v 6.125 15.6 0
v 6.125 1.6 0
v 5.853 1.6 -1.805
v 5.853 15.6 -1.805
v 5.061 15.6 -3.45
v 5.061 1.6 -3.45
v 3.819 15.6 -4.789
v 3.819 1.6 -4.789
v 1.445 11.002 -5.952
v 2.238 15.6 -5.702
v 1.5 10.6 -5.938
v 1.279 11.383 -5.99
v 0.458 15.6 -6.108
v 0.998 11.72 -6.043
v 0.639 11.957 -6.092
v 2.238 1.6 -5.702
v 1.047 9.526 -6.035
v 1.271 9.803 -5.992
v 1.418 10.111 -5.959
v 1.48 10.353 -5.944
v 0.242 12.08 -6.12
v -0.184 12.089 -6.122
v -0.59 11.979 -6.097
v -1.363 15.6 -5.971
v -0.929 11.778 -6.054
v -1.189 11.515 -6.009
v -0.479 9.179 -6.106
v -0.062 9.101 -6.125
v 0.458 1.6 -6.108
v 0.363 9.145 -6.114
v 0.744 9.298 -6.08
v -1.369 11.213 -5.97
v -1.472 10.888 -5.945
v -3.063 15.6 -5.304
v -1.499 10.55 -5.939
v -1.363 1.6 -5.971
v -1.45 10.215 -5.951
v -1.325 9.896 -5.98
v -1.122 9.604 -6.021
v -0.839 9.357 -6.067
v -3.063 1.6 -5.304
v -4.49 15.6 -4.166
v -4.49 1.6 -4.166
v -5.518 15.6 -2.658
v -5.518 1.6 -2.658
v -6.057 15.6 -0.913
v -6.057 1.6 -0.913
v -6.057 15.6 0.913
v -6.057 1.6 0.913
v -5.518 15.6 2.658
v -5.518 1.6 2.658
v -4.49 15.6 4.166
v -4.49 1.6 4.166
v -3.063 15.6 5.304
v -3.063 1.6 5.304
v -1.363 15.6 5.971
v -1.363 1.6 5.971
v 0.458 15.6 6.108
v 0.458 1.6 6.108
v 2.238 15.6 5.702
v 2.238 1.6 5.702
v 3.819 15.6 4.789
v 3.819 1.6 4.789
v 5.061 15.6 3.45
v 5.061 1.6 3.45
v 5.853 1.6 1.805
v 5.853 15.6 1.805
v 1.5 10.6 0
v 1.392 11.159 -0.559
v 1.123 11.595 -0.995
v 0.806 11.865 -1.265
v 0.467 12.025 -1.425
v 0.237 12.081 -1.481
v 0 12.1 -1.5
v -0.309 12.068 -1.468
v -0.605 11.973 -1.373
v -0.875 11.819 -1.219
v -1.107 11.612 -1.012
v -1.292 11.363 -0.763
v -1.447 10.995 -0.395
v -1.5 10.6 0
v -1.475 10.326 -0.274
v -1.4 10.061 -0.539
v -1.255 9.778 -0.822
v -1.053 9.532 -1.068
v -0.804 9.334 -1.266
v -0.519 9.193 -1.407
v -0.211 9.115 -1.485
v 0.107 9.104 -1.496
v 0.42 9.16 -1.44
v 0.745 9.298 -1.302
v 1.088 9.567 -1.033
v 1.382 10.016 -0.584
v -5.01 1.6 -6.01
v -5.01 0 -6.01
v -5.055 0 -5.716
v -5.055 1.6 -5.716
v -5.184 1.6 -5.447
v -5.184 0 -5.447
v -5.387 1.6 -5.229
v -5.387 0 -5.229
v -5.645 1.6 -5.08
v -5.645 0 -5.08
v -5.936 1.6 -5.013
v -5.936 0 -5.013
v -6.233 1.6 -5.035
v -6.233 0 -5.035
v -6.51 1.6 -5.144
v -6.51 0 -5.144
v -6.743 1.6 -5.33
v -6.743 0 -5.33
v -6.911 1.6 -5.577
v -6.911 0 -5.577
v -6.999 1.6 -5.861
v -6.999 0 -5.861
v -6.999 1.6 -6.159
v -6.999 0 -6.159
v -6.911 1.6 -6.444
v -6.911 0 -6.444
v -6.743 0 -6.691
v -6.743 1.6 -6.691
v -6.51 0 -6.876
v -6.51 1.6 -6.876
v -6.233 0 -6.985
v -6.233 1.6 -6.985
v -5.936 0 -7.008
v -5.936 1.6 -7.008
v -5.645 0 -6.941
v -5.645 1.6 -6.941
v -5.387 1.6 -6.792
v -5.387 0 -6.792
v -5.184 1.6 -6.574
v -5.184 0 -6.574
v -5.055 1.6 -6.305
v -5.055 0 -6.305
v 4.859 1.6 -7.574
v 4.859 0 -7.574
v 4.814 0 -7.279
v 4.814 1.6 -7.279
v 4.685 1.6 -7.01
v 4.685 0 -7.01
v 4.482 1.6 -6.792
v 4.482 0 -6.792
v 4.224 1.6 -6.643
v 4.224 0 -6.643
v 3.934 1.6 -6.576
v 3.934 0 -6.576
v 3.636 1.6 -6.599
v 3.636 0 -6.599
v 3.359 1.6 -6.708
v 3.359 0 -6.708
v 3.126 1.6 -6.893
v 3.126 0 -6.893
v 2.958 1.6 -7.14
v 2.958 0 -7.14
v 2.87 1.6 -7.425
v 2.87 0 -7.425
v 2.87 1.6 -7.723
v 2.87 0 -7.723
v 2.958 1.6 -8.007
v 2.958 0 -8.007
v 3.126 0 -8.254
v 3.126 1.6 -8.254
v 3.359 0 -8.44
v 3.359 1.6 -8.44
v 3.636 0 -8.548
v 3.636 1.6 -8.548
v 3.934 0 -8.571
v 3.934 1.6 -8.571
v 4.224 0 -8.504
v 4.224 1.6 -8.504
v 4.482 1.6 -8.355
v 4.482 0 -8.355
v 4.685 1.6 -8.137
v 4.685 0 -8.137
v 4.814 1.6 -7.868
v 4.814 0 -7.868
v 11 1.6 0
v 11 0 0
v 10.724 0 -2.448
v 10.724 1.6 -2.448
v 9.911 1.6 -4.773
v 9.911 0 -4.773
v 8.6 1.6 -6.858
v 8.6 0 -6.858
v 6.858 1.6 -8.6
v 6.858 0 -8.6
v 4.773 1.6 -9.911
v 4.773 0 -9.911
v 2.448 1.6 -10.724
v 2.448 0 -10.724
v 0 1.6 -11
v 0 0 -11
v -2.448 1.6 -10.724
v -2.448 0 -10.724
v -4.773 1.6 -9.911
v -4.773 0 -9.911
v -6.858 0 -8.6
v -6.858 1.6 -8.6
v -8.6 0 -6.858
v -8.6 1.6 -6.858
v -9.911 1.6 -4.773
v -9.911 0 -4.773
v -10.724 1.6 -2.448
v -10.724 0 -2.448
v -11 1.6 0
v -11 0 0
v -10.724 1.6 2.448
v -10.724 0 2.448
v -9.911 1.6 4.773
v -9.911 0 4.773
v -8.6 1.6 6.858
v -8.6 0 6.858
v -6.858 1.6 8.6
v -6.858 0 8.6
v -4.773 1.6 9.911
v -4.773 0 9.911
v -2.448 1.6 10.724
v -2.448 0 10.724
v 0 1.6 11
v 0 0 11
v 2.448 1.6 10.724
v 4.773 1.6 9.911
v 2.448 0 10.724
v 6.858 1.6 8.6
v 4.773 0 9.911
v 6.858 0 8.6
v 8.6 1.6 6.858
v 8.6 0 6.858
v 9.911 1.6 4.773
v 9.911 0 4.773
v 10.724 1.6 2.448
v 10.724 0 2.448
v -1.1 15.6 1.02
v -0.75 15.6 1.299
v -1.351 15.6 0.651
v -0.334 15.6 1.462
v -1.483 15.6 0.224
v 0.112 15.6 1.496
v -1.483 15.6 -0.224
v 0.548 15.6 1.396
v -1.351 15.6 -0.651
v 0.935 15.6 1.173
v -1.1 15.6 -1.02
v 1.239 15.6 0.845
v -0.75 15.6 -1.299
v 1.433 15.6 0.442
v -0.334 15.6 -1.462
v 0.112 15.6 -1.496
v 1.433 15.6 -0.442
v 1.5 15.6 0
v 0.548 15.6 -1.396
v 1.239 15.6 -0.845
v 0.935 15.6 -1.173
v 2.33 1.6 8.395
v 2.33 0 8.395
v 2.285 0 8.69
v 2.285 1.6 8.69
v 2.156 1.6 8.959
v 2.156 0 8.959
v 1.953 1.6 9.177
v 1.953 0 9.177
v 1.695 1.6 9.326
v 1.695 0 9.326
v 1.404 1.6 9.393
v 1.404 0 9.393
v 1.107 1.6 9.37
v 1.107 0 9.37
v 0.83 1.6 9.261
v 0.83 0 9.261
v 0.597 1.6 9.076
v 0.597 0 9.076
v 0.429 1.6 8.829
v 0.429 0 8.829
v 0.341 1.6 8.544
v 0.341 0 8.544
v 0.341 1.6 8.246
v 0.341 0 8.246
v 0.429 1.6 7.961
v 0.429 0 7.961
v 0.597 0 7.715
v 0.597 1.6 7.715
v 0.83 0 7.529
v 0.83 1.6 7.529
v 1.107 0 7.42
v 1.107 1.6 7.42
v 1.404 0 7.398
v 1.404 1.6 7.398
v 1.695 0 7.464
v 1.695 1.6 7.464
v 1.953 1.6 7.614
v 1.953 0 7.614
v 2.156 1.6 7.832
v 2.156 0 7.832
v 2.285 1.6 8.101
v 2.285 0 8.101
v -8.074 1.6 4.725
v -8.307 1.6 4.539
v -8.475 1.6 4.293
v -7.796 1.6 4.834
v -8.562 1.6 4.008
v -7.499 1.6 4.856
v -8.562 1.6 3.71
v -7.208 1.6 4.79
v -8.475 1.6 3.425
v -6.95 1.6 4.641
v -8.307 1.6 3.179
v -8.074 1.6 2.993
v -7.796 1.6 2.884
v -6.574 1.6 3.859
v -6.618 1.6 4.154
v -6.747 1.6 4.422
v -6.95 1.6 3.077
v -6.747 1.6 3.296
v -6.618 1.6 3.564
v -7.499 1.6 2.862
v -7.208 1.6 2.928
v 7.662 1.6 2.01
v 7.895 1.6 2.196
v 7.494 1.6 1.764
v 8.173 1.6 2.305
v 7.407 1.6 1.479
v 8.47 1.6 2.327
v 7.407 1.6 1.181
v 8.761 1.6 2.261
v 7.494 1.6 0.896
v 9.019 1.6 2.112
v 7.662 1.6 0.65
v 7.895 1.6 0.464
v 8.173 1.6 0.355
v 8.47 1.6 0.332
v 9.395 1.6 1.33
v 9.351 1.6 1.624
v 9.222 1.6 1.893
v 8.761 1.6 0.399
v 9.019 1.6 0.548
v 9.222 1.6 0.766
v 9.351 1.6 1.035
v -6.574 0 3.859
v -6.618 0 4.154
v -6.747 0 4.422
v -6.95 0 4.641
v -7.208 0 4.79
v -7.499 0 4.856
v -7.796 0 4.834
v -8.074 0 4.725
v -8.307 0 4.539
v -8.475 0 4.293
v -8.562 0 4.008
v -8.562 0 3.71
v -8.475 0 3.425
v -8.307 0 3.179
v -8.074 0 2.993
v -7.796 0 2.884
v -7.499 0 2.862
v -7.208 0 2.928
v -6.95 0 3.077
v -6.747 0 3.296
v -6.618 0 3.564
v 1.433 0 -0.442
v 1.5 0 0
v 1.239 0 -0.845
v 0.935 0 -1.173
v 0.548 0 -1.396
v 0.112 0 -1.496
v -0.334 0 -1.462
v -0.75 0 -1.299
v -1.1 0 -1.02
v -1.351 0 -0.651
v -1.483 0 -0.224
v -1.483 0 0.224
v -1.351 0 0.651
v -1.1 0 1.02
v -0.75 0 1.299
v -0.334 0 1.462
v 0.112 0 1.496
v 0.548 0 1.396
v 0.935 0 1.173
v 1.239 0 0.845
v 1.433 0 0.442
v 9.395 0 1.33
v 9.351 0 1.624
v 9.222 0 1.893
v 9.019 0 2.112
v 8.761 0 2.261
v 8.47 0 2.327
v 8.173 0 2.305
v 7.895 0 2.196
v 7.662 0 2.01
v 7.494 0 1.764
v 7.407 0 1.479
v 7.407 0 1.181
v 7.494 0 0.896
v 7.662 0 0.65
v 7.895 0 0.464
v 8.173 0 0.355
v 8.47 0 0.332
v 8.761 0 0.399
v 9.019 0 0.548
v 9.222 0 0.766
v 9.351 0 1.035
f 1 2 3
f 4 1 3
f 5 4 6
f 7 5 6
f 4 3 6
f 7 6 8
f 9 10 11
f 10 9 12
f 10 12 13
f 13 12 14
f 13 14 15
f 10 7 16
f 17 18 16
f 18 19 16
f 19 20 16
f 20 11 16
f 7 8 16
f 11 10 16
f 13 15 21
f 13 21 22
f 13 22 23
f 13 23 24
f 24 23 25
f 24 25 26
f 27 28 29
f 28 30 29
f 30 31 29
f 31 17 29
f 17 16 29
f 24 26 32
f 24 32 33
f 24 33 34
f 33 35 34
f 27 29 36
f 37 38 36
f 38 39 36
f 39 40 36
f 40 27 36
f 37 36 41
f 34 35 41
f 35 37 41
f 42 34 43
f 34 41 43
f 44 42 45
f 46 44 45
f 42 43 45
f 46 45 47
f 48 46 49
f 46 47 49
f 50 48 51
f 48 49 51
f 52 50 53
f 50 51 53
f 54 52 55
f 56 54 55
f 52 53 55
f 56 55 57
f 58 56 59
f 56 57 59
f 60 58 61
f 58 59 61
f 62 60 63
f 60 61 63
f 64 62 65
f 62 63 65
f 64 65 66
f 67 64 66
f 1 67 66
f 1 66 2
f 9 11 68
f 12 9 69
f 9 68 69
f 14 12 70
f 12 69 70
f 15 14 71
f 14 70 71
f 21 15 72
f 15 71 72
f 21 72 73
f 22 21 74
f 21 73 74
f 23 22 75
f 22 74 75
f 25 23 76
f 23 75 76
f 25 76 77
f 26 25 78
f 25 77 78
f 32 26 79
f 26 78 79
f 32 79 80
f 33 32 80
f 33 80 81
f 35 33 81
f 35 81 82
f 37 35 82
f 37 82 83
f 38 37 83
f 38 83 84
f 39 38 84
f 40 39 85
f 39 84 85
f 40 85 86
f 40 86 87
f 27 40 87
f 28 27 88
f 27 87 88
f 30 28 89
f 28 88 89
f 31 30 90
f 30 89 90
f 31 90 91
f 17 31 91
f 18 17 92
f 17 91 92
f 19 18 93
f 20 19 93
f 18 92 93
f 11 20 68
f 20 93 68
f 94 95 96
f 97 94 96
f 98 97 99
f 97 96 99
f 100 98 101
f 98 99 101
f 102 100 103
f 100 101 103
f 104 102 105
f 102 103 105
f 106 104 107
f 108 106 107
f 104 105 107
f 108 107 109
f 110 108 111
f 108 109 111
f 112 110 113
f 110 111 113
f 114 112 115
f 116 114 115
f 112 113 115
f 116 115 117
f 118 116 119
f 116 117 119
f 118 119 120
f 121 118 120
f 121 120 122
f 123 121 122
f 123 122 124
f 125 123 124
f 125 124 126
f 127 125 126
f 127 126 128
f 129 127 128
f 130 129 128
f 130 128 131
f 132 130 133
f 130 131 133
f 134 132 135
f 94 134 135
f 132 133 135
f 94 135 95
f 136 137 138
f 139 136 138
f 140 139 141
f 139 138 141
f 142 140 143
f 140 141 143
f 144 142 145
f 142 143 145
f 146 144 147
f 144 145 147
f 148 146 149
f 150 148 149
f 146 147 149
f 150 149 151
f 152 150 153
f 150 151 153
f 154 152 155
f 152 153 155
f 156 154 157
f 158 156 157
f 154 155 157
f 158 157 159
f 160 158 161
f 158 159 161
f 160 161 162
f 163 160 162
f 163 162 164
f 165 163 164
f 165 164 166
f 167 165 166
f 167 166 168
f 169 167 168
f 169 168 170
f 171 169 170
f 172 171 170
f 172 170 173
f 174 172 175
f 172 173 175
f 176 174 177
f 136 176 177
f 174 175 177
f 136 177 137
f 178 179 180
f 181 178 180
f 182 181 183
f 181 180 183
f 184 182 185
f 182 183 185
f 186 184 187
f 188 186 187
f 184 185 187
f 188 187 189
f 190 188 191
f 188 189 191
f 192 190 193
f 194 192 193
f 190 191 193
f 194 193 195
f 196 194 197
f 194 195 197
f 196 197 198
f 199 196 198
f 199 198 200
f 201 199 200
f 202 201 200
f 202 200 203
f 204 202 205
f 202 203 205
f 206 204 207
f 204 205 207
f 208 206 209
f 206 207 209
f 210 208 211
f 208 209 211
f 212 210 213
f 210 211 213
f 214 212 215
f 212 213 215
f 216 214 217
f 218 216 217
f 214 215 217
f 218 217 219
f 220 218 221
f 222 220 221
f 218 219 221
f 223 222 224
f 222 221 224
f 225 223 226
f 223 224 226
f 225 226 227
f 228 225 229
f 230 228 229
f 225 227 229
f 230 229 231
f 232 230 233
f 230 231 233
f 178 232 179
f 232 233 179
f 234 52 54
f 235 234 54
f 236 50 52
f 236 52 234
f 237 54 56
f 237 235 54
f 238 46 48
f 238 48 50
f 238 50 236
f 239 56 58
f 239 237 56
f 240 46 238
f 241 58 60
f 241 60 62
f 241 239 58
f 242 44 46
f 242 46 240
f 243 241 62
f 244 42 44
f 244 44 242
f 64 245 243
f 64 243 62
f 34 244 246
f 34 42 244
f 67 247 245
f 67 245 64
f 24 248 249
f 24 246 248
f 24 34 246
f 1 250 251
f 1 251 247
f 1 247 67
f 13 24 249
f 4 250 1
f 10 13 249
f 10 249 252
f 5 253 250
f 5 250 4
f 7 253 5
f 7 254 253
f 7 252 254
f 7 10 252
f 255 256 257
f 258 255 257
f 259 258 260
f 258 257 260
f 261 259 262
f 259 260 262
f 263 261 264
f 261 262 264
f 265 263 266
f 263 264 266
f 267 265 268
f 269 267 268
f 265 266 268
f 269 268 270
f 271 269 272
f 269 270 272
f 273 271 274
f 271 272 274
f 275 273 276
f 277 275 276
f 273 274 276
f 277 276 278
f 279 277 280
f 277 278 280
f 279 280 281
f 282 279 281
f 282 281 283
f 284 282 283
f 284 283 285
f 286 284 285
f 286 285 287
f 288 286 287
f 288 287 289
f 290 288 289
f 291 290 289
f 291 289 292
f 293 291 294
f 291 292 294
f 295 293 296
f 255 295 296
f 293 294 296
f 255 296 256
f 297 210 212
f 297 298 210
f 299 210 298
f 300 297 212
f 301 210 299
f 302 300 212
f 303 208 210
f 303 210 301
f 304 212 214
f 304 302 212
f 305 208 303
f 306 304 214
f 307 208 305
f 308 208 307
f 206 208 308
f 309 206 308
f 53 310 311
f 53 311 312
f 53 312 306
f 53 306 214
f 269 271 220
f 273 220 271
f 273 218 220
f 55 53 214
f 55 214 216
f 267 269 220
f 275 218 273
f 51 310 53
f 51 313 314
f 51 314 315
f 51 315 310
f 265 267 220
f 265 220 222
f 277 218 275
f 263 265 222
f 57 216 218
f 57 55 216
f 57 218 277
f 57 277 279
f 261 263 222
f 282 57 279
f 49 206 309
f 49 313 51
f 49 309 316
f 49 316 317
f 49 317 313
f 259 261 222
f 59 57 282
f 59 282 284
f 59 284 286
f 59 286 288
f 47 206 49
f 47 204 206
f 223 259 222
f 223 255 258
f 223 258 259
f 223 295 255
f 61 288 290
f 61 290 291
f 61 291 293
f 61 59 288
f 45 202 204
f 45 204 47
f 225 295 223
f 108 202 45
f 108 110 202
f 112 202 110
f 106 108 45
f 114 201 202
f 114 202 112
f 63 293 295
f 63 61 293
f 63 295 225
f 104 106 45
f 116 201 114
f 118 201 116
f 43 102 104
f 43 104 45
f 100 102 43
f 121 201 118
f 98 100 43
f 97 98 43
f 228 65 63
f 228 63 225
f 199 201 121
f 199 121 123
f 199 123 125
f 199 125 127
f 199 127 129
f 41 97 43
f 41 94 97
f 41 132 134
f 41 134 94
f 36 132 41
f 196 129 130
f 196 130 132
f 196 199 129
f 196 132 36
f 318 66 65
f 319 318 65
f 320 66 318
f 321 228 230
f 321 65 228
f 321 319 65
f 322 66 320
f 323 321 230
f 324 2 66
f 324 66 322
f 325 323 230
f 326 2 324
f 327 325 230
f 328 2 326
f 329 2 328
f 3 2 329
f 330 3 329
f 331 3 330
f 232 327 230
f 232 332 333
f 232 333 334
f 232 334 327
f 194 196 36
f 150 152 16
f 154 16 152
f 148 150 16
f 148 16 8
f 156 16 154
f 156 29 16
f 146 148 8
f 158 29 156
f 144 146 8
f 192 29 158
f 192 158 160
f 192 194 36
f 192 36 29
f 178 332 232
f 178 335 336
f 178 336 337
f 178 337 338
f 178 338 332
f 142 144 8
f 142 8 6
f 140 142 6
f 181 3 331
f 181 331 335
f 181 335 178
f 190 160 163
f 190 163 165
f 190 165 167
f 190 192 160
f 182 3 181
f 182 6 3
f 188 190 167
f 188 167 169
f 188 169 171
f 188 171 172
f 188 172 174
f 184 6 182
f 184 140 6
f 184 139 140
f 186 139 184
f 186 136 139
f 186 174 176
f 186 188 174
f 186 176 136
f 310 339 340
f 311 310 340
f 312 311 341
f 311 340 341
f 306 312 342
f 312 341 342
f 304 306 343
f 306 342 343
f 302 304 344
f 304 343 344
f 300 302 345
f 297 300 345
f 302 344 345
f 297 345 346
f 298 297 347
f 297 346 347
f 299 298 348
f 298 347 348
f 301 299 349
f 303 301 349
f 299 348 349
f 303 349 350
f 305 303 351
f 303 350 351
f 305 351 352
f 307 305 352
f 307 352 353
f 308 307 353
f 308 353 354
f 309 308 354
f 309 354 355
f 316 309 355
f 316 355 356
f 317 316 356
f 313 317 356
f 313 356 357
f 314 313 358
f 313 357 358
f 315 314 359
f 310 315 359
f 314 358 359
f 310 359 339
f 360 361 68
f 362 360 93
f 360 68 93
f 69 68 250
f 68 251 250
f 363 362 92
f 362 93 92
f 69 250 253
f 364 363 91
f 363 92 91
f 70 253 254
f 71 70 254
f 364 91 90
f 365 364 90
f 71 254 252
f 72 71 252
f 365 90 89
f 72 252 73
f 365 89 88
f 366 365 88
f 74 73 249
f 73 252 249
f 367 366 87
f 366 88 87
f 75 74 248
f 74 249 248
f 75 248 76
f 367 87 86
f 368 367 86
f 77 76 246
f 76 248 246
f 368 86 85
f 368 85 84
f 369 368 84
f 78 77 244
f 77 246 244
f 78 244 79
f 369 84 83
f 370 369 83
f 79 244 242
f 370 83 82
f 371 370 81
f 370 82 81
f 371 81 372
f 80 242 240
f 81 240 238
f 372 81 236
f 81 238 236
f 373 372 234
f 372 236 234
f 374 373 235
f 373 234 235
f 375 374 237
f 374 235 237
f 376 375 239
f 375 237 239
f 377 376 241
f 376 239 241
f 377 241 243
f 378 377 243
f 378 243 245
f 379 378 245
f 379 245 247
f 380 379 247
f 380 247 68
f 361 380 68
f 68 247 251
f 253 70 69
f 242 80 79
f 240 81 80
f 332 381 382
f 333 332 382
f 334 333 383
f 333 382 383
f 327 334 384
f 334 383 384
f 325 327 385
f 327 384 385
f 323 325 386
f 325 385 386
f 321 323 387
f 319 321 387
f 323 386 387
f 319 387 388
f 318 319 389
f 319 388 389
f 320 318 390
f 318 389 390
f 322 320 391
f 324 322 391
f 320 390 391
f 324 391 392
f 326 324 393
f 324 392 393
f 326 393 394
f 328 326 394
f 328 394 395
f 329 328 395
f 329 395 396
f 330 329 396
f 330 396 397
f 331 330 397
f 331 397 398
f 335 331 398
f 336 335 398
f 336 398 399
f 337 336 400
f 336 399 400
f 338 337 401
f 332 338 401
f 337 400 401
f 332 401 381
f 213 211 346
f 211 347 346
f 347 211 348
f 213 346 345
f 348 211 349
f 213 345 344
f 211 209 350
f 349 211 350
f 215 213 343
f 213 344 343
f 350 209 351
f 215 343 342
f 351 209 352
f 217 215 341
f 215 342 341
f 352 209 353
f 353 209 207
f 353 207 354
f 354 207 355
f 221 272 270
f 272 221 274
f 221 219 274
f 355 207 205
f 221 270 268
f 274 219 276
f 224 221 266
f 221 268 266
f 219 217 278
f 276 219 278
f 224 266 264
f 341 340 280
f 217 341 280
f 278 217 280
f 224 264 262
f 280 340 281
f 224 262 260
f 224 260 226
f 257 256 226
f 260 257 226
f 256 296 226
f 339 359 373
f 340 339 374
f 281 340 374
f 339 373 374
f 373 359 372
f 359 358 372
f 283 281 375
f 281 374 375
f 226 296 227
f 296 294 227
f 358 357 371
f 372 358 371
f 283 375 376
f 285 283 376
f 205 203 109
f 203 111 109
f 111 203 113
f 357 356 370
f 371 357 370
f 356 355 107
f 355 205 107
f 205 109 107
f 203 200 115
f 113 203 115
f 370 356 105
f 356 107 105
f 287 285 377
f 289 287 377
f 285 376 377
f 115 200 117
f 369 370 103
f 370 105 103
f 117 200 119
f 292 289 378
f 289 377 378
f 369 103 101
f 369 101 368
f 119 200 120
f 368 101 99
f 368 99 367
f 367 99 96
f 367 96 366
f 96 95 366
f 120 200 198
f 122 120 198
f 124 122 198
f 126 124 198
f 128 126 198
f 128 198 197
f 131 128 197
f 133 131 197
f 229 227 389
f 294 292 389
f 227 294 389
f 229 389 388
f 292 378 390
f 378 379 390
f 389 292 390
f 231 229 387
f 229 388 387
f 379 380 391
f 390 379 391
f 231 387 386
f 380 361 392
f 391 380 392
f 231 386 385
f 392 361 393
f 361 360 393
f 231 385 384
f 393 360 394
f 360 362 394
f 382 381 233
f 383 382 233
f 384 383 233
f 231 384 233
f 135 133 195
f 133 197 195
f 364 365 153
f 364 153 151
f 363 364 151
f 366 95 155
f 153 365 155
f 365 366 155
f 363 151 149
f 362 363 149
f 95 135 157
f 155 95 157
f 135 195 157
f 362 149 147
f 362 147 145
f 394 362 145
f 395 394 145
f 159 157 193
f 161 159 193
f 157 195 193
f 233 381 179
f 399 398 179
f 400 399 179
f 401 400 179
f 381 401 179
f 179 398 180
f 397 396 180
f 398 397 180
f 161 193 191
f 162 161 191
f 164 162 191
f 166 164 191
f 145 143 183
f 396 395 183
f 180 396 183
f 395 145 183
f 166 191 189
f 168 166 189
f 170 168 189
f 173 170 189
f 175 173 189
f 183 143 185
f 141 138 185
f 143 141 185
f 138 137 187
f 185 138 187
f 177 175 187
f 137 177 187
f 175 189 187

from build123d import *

# Parameters (mm, degrees)
SKIZZE1_R                       = 11
AUFSATZ_LINEAR_AUSTRAGEN1_DEPTH = 1.6
SKIZZE2_R                       = 6.125
AUFSATZ_LINEAR_AUSTRAGEN2_DEPTH = 14
SKIZZE3_R                       = 1.5
SCHNITT_LINEAR_AUSTRAGEN1_DEPTH = 16.6
SKIZZE5_R                       = 0.830846671
SCHNITT_LINEAR_AUSTRAGEN3_DEPTH = 12
SKIZZE8_R                       = 1
SCHNITT_LINEAR_AUSTRAGEN4_DEPTH = 1.6
SKIZZE7_R                       = 1.5
SCHNITT_LINEAR_AUSTRAGEN5_DEPTH = 10


with BuildPart() as part:
    # Skizze1 → Aufsatz-Linear austragen1 (new body)
    with BuildSketch(Plane(origin=(0, 0, 0), x_dir=(1, 0, 0), z_dir=(0, 1, 0))):
        Circle(SKIZZE1_R)
    extrude(amount=AUFSATZ_LINEAR_AUSTRAGEN1_DEPTH)

    # Skizze2 → Aufsatz-Linear austragen2 (add)
    with BuildSketch(Plane(origin=(0, 1.6, 0), x_dir=(1, 0, 0), z_dir=(0, 1, 0))):
        Circle(SKIZZE2_R)
    extrude(amount=AUFSATZ_LINEAR_AUSTRAGEN2_DEPTH)

    # Skizze3 → Schnitt-Linear austragen1 (cut, through all)
    with BuildSketch(Plane(origin=(0, 15.6, 0), x_dir=(1, 0, 0), z_dir=(0, 1, 0))):
        Circle(SKIZZE3_R)
    extrude(amount=-SCHNITT_LINEAR_AUSTRAGEN1_DEPTH, mode=Mode.SUBTRACT)

    # Skizze5 → Schnitt-Linear austragen3 (cut, through all)
    with BuildSketch(Plane.XY):
        with Locations((0, 10.6)):
            Circle(SKIZZE5_R)
    extrude(amount=-SCHNITT_LINEAR_AUSTRAGEN3_DEPTH, mode=Mode.SUBTRACT)

    # Skizze8 → Schnitt-Linear austragen4 (cut)
    with BuildSketch(Plane.XZ):
        with Locations((-6.01040764, -6.01040764)):
            Circle(SKIZZE8_R)
        with Locations((-7.573555456, 3.858919248)):
            Circle(SKIZZE8_R)
        with Locations((1.329692953, 8.395350895)):
            Circle(SKIZZE8_R)
        with Locations((8.395350895, 1.329692953)):
            Circle(SKIZZE8_R)
        with Locations((3.858919248, -7.573555456)):
            Circle(SKIZZE8_R)
    extrude(amount=-SCHNITT_LINEAR_AUSTRAGEN4_DEPTH, mode=Mode.SUBTRACT)

    # Skizze7 → Schnitt-Linear austragen5 (cut)
    with BuildSketch(Plane.XY):
        with Locations((0, 10.6)):
            Circle(SKIZZE7_R)
    extrude(amount=-SCHNITT_LINEAR_AUSTRAGEN5_DEPTH, mode=Mode.SUBTRACT)


solid = part.part
